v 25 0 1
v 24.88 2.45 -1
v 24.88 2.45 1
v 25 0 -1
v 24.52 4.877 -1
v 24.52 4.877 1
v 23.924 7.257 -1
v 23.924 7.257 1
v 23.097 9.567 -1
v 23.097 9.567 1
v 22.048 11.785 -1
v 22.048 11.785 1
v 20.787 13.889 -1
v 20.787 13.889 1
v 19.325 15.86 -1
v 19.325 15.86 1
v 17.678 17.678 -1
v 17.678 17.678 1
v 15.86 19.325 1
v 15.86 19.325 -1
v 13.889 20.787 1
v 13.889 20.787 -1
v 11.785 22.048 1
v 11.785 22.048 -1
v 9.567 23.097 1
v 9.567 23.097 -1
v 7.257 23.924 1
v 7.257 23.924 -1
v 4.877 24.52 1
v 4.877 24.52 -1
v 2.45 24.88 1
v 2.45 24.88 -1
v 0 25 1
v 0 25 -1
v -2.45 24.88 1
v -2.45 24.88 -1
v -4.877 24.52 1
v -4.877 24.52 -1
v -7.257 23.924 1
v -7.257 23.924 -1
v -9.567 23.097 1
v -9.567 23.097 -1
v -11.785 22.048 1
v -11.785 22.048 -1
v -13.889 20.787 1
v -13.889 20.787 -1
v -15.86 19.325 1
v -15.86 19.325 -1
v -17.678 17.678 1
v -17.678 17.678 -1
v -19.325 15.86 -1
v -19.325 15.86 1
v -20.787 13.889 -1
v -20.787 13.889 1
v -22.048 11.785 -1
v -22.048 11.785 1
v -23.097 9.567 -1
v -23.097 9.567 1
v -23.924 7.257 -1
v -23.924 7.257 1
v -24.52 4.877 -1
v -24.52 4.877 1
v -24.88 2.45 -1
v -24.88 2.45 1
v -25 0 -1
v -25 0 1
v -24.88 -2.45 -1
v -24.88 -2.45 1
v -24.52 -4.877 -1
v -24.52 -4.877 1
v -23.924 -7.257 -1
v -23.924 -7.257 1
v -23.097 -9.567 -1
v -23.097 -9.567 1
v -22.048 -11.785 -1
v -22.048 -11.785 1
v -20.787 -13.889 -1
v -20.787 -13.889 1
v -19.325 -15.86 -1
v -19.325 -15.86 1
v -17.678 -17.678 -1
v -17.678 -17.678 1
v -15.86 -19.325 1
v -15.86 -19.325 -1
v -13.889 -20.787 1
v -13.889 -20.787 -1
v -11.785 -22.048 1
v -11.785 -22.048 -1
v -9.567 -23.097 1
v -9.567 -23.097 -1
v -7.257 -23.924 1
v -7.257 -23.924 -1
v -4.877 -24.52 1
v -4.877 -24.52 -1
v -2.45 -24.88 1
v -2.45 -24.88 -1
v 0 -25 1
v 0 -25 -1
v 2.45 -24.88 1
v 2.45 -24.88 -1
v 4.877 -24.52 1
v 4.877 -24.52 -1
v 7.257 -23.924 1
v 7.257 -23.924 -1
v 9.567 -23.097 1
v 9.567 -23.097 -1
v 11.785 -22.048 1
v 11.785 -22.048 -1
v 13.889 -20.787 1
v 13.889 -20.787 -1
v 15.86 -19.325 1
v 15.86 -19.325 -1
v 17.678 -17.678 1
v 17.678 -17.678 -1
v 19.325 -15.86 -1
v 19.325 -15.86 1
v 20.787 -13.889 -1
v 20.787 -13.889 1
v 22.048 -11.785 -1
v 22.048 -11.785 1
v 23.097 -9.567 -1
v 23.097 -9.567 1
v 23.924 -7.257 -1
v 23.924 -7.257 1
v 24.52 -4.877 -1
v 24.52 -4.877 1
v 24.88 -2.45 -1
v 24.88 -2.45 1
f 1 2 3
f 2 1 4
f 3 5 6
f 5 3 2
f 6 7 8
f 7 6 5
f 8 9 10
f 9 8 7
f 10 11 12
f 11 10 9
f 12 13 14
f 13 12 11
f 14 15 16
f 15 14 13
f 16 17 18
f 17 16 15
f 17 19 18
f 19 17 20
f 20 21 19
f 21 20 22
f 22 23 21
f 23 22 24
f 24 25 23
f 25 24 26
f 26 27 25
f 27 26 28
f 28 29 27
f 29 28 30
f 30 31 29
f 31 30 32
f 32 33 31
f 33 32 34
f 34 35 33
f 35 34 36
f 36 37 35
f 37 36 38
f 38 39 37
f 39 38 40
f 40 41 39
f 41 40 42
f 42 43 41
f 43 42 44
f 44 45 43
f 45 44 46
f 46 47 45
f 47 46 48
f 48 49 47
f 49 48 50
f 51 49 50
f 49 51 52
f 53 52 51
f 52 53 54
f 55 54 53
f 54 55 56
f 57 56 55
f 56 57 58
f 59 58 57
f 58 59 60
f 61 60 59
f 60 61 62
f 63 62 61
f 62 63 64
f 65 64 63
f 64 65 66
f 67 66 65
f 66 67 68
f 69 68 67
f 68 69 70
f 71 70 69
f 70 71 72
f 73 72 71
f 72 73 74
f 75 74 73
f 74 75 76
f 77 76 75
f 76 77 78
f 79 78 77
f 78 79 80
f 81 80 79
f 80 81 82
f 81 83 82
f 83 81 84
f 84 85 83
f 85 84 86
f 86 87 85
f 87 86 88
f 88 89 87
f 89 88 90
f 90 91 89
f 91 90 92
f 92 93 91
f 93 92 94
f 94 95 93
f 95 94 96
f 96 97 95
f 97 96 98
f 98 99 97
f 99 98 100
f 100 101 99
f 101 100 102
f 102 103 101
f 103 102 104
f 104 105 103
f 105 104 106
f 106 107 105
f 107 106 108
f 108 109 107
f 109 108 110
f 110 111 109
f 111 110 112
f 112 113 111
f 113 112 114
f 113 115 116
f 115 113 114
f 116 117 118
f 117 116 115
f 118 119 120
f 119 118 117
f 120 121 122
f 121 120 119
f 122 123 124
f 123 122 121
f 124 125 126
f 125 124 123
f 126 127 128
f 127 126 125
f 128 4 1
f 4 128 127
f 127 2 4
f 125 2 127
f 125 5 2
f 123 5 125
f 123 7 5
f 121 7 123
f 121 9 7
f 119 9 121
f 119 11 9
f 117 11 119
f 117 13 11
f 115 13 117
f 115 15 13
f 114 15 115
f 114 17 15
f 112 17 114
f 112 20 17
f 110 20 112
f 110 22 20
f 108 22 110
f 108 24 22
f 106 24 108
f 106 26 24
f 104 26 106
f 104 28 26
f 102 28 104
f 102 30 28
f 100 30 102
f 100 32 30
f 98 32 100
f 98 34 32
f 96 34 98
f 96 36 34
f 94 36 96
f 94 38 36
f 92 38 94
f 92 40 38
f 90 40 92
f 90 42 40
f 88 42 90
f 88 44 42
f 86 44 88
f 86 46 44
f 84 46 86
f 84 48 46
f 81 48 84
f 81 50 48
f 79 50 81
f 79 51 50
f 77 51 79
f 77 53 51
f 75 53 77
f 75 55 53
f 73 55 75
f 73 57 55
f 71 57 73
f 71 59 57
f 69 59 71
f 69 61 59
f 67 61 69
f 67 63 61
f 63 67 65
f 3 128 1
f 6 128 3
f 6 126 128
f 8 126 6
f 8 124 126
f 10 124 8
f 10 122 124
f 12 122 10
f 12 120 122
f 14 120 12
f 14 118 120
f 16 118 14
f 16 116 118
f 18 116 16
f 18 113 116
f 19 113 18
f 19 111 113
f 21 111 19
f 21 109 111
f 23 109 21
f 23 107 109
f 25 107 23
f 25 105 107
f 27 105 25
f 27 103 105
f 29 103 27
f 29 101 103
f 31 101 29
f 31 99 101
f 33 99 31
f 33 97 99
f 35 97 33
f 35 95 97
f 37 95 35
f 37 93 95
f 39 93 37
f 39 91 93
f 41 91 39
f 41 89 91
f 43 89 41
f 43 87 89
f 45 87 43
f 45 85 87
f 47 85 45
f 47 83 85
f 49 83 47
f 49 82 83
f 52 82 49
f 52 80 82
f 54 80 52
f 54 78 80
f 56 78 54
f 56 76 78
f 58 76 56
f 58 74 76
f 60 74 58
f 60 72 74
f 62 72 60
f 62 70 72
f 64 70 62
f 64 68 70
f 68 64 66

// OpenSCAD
$fn = $preview ? 32 : 64;

height = 2;

baseDiameter = 50;
imageDiameter = 25;

// Image

module image() {
    import("svg/toilet.svg", center = true);
}

// Border

// color("black") {
//     linear_extrude(height = height) {
//         offset(delta = 2){
//             projection() {
//                 image();
//             }
//         }
//     }
// }

// color("white") {
//     linear_extrude(height = height) {
//         projection() {
//             image();
//         }
//     }
// }

// Base

color("black") {
    cylinder(d=baseDiameter, h=height, center=true);
}

// color("white") {
//     // projection(cut = true) {
//     resize([imageDiameter, imageDiameter, height]) {
//         linear_extrude() {
//             // projection() {
//                 image();
//             // }
//         }
//     }
// }
